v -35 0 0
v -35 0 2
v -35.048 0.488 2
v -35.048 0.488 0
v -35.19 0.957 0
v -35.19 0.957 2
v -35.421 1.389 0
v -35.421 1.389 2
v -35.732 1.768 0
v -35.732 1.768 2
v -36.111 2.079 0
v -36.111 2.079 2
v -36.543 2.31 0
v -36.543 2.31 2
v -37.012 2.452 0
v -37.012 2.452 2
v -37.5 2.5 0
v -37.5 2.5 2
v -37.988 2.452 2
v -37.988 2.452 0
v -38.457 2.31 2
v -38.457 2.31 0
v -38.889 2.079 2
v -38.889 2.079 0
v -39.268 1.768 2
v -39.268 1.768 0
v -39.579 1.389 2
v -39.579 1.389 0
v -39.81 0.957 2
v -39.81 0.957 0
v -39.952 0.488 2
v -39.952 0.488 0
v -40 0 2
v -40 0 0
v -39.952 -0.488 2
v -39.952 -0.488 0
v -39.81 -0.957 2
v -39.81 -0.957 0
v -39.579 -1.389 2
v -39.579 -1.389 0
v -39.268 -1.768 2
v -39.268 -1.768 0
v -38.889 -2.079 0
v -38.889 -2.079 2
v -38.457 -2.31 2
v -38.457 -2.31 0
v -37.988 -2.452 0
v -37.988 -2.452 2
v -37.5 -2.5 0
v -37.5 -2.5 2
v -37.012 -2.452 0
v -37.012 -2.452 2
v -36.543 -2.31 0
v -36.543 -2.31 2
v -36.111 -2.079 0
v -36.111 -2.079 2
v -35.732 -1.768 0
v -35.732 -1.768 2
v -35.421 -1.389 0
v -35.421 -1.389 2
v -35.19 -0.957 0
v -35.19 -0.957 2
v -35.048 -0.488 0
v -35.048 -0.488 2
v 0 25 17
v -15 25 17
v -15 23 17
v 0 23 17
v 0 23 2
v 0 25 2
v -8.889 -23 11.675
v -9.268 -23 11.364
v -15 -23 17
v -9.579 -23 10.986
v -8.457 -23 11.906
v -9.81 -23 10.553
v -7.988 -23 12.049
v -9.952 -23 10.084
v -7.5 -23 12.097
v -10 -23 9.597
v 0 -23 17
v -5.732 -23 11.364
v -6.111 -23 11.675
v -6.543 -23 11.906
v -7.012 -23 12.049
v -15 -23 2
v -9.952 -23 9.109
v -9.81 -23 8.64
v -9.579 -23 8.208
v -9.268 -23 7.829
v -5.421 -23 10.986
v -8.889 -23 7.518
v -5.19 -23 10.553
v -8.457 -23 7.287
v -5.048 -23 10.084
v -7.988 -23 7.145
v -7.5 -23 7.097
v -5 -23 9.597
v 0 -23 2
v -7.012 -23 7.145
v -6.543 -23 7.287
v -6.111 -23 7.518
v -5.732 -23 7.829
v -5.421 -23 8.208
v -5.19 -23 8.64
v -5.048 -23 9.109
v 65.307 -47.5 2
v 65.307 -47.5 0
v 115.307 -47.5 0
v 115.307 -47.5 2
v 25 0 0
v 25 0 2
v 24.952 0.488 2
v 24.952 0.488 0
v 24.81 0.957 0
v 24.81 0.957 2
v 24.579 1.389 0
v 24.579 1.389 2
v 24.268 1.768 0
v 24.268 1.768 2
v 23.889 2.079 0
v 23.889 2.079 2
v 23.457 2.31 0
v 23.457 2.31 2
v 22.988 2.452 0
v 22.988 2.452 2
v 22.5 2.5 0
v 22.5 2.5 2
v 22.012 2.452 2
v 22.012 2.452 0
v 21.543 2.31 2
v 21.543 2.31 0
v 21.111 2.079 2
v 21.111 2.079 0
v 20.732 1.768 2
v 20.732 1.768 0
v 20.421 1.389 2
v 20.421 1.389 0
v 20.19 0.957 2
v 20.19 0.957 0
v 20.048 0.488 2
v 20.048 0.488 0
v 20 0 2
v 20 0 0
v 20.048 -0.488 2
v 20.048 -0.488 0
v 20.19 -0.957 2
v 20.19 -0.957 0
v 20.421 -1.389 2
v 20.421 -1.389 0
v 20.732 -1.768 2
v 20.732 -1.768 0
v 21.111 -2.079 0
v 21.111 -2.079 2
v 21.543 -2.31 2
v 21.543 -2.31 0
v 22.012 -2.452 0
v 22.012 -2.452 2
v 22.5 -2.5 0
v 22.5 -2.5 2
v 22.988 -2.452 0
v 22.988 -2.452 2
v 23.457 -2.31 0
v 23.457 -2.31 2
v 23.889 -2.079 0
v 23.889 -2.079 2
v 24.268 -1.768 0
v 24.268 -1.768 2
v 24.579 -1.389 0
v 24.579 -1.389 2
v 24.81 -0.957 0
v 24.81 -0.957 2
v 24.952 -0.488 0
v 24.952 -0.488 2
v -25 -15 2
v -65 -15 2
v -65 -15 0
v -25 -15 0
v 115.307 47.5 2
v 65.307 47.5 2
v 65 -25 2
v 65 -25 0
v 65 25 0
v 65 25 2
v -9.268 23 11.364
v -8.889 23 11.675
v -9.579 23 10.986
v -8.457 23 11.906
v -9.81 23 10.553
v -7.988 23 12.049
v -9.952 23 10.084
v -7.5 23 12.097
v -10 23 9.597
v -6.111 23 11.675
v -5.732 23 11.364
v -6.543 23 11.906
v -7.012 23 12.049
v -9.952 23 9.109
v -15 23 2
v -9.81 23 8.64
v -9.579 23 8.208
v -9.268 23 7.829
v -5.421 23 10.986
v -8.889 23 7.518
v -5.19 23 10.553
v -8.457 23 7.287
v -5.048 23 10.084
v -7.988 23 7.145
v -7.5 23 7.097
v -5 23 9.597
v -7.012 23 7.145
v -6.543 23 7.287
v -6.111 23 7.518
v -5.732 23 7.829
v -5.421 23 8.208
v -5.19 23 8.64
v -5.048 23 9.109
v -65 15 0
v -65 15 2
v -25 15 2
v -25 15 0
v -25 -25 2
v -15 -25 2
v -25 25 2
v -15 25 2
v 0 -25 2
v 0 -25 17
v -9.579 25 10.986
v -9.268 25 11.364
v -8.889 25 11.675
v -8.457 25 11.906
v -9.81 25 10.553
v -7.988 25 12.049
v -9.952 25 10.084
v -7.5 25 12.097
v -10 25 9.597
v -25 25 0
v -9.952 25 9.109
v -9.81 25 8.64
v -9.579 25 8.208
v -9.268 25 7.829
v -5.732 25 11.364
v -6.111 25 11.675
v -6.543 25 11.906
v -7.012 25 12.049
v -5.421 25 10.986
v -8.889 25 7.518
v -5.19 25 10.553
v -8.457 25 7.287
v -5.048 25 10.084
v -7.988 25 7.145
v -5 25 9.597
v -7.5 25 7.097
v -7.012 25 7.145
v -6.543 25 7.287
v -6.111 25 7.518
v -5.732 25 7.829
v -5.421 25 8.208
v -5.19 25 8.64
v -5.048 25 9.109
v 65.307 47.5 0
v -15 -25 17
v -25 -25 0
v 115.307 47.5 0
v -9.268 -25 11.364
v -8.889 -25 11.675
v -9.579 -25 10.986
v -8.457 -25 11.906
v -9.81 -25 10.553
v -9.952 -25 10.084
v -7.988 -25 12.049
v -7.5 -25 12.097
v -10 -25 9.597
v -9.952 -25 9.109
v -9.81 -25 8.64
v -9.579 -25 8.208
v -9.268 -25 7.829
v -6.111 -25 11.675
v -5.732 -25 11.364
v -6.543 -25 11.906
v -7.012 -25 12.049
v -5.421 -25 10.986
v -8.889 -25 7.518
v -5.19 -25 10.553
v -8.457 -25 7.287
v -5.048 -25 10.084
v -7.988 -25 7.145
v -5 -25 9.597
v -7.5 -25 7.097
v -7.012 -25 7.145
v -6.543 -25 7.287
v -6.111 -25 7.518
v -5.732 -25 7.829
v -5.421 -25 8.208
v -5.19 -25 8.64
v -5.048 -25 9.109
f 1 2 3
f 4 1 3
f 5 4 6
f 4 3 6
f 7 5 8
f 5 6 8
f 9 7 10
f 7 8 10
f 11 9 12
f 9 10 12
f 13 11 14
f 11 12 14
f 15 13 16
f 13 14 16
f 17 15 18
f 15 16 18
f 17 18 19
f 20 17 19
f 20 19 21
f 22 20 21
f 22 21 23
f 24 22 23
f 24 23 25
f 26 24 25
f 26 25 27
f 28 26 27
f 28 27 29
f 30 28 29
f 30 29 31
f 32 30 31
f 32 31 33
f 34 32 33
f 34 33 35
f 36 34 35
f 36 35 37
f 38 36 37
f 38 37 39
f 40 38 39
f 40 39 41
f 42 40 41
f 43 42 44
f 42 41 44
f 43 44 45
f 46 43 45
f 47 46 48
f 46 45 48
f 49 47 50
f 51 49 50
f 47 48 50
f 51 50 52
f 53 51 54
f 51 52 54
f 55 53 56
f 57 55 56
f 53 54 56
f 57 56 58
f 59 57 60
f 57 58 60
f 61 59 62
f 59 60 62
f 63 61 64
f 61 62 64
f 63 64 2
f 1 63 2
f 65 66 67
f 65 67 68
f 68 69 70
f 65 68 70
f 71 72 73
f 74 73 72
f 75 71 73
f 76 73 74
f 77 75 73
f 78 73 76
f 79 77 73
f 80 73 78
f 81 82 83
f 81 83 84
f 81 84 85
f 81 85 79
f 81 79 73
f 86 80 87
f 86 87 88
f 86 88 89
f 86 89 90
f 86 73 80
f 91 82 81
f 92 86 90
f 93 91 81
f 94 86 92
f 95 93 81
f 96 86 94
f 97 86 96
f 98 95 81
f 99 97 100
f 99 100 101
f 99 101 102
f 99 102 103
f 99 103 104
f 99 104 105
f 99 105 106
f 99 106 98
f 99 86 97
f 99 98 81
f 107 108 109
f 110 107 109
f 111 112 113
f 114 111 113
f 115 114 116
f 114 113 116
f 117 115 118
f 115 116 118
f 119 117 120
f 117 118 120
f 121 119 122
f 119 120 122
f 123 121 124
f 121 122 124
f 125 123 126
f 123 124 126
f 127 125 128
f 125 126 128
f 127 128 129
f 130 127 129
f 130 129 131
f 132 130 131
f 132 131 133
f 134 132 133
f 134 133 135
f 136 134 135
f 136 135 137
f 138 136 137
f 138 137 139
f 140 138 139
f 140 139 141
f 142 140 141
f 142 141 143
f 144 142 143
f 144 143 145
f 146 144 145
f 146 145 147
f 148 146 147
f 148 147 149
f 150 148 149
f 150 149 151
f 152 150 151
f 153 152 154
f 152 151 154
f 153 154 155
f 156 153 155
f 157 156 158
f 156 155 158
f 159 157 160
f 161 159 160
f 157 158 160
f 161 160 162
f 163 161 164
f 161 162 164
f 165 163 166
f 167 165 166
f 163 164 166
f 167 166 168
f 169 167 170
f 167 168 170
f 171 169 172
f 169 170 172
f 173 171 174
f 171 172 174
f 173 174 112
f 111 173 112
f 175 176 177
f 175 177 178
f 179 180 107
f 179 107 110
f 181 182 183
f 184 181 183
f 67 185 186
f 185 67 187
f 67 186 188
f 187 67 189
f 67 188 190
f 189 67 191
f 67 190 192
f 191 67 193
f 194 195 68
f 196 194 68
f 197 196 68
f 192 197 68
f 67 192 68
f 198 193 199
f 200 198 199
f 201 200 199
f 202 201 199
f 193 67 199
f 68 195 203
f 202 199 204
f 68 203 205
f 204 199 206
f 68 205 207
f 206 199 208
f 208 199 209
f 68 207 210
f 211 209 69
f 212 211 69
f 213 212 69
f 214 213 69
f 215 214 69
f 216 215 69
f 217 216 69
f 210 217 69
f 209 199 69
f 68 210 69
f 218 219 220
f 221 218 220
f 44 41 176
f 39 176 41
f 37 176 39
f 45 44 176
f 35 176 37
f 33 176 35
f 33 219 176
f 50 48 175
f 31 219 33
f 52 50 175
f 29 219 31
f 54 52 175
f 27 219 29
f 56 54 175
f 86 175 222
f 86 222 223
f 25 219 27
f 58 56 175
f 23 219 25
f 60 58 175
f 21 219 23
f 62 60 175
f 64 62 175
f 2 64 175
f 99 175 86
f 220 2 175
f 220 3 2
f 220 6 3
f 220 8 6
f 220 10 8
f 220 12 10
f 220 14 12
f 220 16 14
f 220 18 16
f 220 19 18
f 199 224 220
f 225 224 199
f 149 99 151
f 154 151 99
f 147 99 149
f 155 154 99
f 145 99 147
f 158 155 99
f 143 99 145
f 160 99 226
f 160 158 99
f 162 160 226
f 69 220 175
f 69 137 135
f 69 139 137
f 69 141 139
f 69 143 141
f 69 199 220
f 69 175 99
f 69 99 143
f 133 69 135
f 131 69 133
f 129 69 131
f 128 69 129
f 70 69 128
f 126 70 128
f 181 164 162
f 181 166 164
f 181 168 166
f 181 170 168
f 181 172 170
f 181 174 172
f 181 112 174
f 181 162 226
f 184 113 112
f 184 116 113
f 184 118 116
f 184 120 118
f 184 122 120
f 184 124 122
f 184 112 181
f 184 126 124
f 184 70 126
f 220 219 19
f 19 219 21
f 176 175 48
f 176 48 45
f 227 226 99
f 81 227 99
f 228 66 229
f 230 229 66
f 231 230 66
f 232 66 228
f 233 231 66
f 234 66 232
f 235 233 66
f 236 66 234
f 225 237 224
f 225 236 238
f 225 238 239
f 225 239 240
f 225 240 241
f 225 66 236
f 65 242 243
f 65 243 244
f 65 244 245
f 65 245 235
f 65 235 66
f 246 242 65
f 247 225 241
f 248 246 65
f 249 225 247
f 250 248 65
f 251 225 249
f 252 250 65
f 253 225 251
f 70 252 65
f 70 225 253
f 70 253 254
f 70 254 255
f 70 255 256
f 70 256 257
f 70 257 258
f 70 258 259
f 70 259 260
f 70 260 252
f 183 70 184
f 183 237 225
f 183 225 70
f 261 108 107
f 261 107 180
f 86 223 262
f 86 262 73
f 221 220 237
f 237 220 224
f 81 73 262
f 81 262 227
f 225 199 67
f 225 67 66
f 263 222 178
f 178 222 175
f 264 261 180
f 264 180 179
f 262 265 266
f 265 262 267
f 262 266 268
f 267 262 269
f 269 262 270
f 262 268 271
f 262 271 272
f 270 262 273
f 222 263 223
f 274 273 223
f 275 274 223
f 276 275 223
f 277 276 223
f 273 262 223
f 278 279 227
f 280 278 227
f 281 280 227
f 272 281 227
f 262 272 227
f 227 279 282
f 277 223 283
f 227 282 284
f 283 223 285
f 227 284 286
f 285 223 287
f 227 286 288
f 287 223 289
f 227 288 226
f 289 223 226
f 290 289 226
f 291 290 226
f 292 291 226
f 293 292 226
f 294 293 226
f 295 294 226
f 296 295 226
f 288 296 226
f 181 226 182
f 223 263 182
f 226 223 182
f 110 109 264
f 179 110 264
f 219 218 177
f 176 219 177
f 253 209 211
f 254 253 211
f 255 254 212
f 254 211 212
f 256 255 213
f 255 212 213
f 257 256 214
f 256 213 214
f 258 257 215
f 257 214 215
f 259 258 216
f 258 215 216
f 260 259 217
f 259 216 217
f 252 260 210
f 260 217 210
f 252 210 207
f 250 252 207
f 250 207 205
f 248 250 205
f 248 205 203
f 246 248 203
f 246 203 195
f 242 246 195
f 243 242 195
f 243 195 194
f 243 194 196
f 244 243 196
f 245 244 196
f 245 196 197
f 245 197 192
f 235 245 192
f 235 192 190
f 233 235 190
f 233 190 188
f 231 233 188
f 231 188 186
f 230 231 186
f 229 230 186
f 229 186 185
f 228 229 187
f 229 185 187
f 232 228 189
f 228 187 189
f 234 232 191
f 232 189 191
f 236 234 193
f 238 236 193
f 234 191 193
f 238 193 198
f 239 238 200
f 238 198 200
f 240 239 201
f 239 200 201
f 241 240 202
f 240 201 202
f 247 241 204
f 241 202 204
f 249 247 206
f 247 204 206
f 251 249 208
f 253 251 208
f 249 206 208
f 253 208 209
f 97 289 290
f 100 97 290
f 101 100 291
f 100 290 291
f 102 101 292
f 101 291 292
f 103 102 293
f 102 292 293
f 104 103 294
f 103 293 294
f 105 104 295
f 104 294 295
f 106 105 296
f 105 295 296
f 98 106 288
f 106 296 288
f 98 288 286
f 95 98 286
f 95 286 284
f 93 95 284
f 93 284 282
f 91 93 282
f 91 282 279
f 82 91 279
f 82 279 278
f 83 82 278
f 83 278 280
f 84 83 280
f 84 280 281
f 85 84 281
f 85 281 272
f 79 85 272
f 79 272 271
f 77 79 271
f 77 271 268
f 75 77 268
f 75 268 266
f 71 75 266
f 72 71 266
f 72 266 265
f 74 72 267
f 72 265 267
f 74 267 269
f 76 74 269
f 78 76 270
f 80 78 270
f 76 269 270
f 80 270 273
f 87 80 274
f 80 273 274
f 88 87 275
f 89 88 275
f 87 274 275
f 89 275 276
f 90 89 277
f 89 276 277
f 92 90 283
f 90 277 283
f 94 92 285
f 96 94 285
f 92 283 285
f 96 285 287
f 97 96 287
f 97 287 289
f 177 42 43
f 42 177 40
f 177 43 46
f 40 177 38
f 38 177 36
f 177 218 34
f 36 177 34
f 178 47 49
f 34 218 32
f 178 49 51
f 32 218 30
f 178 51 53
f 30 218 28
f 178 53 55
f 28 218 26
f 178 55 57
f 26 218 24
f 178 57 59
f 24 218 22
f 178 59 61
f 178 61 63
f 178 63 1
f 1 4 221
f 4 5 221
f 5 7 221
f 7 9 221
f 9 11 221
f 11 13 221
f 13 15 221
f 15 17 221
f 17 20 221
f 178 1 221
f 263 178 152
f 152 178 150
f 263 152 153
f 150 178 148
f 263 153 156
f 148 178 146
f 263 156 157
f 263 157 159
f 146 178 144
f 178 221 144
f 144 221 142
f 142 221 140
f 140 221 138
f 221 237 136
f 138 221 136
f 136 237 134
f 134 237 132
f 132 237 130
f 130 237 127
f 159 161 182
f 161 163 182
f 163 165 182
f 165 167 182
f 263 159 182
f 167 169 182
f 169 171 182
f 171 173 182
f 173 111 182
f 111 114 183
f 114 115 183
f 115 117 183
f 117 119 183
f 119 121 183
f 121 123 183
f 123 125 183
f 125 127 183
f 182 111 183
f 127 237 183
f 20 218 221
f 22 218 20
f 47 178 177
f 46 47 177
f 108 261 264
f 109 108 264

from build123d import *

# Parameters (mm, degrees)
BOSS_EXTRUDE1_DEPTH   = 2
SKETCH1_W             = 50
SKETCH1_H             = 95
BOSS_EXTRUDE1_2_DEPTH = 2
SKETCH1_4_W           = 15
SKETCH1_4_H           = 2
BOSS_EXTRUDE2_DEPTH   = 17
SKETCH2_R             = 2.5
SKETCH2_W             = 40
SKETCH2_H             = 10
CUT_EXTRUDE1_DEPTH    = 4
SKETCH3_R             = 2.5
CUT_EXTRUDE2_DEPTH    = 138.262677829


with BuildPart() as part:
    # Sketch1 → Boss-Extrude1 (new body)
    with BuildSketch(Plane.XY):
        Polygon((-65, 25), (-65, -25), (-15, -25), (-15, -23), (0, -23), (0, -25), (65, -25), (65, 25), (0, 25), (0, 23), (-15, 23), (-15, 25), align=None)
    extrude(amount=BOSS_EXTRUDE1_DEPTH)

    # Sketch1<4> → Boss-Extrude2 (add)
    with BuildSketch(Plane.XY):
        with Locations((-7.5, -24)):
            Rectangle(SKETCH1_4_W, SKETCH1_4_H)
        with Locations((-7.5, 24)):
            Rectangle(SKETCH1_4_W, SKETCH1_4_H)
    extrude(amount=BOSS_EXTRUDE2_DEPTH)

    # Sketch2 → Cut-Extrude1 (cut)
    with BuildSketch(Plane.XY.offset(2)):
        with Locations((-37.5, 0)):
            Circle(SKETCH2_R)
        with Locations((22.5, 0)):
            Circle(SKETCH2_R)
        with Locations((-45, -20)):
            Rectangle(SKETCH2_W, SKETCH2_H)
        with Locations((-45, 20)):
            Rectangle(SKETCH2_W, SKETCH2_H)
    extrude(amount=-CUT_EXTRUDE1_DEPTH, mode=Mode.SUBTRACT)

    # Sketch3 → Cut-Extrude2 (cut, through all)
    with BuildSketch(Plane(origin=(0, -25, 0), x_dir=(-1, 0, 0), z_dir=(0, -1, 0))):
        with Locations((7.5, -9.596652221)):
            Circle(SKETCH3_R)
    extrude(amount=-CUT_EXTRUDE2_DEPTH, mode=Mode.SUBTRACT)


with BuildPart() as body_2:
    # Sketch1 → Boss-Extrude1 2 (new body)
    with BuildSketch(Plane.XY):
        with Locations((90.307383653, 0)):
            Rectangle(SKETCH1_W, SKETCH1_H)
    extrude(amount=BOSS_EXTRUDE1_2_DEPTH)


solid = Compound([part.part, body_2.part])
